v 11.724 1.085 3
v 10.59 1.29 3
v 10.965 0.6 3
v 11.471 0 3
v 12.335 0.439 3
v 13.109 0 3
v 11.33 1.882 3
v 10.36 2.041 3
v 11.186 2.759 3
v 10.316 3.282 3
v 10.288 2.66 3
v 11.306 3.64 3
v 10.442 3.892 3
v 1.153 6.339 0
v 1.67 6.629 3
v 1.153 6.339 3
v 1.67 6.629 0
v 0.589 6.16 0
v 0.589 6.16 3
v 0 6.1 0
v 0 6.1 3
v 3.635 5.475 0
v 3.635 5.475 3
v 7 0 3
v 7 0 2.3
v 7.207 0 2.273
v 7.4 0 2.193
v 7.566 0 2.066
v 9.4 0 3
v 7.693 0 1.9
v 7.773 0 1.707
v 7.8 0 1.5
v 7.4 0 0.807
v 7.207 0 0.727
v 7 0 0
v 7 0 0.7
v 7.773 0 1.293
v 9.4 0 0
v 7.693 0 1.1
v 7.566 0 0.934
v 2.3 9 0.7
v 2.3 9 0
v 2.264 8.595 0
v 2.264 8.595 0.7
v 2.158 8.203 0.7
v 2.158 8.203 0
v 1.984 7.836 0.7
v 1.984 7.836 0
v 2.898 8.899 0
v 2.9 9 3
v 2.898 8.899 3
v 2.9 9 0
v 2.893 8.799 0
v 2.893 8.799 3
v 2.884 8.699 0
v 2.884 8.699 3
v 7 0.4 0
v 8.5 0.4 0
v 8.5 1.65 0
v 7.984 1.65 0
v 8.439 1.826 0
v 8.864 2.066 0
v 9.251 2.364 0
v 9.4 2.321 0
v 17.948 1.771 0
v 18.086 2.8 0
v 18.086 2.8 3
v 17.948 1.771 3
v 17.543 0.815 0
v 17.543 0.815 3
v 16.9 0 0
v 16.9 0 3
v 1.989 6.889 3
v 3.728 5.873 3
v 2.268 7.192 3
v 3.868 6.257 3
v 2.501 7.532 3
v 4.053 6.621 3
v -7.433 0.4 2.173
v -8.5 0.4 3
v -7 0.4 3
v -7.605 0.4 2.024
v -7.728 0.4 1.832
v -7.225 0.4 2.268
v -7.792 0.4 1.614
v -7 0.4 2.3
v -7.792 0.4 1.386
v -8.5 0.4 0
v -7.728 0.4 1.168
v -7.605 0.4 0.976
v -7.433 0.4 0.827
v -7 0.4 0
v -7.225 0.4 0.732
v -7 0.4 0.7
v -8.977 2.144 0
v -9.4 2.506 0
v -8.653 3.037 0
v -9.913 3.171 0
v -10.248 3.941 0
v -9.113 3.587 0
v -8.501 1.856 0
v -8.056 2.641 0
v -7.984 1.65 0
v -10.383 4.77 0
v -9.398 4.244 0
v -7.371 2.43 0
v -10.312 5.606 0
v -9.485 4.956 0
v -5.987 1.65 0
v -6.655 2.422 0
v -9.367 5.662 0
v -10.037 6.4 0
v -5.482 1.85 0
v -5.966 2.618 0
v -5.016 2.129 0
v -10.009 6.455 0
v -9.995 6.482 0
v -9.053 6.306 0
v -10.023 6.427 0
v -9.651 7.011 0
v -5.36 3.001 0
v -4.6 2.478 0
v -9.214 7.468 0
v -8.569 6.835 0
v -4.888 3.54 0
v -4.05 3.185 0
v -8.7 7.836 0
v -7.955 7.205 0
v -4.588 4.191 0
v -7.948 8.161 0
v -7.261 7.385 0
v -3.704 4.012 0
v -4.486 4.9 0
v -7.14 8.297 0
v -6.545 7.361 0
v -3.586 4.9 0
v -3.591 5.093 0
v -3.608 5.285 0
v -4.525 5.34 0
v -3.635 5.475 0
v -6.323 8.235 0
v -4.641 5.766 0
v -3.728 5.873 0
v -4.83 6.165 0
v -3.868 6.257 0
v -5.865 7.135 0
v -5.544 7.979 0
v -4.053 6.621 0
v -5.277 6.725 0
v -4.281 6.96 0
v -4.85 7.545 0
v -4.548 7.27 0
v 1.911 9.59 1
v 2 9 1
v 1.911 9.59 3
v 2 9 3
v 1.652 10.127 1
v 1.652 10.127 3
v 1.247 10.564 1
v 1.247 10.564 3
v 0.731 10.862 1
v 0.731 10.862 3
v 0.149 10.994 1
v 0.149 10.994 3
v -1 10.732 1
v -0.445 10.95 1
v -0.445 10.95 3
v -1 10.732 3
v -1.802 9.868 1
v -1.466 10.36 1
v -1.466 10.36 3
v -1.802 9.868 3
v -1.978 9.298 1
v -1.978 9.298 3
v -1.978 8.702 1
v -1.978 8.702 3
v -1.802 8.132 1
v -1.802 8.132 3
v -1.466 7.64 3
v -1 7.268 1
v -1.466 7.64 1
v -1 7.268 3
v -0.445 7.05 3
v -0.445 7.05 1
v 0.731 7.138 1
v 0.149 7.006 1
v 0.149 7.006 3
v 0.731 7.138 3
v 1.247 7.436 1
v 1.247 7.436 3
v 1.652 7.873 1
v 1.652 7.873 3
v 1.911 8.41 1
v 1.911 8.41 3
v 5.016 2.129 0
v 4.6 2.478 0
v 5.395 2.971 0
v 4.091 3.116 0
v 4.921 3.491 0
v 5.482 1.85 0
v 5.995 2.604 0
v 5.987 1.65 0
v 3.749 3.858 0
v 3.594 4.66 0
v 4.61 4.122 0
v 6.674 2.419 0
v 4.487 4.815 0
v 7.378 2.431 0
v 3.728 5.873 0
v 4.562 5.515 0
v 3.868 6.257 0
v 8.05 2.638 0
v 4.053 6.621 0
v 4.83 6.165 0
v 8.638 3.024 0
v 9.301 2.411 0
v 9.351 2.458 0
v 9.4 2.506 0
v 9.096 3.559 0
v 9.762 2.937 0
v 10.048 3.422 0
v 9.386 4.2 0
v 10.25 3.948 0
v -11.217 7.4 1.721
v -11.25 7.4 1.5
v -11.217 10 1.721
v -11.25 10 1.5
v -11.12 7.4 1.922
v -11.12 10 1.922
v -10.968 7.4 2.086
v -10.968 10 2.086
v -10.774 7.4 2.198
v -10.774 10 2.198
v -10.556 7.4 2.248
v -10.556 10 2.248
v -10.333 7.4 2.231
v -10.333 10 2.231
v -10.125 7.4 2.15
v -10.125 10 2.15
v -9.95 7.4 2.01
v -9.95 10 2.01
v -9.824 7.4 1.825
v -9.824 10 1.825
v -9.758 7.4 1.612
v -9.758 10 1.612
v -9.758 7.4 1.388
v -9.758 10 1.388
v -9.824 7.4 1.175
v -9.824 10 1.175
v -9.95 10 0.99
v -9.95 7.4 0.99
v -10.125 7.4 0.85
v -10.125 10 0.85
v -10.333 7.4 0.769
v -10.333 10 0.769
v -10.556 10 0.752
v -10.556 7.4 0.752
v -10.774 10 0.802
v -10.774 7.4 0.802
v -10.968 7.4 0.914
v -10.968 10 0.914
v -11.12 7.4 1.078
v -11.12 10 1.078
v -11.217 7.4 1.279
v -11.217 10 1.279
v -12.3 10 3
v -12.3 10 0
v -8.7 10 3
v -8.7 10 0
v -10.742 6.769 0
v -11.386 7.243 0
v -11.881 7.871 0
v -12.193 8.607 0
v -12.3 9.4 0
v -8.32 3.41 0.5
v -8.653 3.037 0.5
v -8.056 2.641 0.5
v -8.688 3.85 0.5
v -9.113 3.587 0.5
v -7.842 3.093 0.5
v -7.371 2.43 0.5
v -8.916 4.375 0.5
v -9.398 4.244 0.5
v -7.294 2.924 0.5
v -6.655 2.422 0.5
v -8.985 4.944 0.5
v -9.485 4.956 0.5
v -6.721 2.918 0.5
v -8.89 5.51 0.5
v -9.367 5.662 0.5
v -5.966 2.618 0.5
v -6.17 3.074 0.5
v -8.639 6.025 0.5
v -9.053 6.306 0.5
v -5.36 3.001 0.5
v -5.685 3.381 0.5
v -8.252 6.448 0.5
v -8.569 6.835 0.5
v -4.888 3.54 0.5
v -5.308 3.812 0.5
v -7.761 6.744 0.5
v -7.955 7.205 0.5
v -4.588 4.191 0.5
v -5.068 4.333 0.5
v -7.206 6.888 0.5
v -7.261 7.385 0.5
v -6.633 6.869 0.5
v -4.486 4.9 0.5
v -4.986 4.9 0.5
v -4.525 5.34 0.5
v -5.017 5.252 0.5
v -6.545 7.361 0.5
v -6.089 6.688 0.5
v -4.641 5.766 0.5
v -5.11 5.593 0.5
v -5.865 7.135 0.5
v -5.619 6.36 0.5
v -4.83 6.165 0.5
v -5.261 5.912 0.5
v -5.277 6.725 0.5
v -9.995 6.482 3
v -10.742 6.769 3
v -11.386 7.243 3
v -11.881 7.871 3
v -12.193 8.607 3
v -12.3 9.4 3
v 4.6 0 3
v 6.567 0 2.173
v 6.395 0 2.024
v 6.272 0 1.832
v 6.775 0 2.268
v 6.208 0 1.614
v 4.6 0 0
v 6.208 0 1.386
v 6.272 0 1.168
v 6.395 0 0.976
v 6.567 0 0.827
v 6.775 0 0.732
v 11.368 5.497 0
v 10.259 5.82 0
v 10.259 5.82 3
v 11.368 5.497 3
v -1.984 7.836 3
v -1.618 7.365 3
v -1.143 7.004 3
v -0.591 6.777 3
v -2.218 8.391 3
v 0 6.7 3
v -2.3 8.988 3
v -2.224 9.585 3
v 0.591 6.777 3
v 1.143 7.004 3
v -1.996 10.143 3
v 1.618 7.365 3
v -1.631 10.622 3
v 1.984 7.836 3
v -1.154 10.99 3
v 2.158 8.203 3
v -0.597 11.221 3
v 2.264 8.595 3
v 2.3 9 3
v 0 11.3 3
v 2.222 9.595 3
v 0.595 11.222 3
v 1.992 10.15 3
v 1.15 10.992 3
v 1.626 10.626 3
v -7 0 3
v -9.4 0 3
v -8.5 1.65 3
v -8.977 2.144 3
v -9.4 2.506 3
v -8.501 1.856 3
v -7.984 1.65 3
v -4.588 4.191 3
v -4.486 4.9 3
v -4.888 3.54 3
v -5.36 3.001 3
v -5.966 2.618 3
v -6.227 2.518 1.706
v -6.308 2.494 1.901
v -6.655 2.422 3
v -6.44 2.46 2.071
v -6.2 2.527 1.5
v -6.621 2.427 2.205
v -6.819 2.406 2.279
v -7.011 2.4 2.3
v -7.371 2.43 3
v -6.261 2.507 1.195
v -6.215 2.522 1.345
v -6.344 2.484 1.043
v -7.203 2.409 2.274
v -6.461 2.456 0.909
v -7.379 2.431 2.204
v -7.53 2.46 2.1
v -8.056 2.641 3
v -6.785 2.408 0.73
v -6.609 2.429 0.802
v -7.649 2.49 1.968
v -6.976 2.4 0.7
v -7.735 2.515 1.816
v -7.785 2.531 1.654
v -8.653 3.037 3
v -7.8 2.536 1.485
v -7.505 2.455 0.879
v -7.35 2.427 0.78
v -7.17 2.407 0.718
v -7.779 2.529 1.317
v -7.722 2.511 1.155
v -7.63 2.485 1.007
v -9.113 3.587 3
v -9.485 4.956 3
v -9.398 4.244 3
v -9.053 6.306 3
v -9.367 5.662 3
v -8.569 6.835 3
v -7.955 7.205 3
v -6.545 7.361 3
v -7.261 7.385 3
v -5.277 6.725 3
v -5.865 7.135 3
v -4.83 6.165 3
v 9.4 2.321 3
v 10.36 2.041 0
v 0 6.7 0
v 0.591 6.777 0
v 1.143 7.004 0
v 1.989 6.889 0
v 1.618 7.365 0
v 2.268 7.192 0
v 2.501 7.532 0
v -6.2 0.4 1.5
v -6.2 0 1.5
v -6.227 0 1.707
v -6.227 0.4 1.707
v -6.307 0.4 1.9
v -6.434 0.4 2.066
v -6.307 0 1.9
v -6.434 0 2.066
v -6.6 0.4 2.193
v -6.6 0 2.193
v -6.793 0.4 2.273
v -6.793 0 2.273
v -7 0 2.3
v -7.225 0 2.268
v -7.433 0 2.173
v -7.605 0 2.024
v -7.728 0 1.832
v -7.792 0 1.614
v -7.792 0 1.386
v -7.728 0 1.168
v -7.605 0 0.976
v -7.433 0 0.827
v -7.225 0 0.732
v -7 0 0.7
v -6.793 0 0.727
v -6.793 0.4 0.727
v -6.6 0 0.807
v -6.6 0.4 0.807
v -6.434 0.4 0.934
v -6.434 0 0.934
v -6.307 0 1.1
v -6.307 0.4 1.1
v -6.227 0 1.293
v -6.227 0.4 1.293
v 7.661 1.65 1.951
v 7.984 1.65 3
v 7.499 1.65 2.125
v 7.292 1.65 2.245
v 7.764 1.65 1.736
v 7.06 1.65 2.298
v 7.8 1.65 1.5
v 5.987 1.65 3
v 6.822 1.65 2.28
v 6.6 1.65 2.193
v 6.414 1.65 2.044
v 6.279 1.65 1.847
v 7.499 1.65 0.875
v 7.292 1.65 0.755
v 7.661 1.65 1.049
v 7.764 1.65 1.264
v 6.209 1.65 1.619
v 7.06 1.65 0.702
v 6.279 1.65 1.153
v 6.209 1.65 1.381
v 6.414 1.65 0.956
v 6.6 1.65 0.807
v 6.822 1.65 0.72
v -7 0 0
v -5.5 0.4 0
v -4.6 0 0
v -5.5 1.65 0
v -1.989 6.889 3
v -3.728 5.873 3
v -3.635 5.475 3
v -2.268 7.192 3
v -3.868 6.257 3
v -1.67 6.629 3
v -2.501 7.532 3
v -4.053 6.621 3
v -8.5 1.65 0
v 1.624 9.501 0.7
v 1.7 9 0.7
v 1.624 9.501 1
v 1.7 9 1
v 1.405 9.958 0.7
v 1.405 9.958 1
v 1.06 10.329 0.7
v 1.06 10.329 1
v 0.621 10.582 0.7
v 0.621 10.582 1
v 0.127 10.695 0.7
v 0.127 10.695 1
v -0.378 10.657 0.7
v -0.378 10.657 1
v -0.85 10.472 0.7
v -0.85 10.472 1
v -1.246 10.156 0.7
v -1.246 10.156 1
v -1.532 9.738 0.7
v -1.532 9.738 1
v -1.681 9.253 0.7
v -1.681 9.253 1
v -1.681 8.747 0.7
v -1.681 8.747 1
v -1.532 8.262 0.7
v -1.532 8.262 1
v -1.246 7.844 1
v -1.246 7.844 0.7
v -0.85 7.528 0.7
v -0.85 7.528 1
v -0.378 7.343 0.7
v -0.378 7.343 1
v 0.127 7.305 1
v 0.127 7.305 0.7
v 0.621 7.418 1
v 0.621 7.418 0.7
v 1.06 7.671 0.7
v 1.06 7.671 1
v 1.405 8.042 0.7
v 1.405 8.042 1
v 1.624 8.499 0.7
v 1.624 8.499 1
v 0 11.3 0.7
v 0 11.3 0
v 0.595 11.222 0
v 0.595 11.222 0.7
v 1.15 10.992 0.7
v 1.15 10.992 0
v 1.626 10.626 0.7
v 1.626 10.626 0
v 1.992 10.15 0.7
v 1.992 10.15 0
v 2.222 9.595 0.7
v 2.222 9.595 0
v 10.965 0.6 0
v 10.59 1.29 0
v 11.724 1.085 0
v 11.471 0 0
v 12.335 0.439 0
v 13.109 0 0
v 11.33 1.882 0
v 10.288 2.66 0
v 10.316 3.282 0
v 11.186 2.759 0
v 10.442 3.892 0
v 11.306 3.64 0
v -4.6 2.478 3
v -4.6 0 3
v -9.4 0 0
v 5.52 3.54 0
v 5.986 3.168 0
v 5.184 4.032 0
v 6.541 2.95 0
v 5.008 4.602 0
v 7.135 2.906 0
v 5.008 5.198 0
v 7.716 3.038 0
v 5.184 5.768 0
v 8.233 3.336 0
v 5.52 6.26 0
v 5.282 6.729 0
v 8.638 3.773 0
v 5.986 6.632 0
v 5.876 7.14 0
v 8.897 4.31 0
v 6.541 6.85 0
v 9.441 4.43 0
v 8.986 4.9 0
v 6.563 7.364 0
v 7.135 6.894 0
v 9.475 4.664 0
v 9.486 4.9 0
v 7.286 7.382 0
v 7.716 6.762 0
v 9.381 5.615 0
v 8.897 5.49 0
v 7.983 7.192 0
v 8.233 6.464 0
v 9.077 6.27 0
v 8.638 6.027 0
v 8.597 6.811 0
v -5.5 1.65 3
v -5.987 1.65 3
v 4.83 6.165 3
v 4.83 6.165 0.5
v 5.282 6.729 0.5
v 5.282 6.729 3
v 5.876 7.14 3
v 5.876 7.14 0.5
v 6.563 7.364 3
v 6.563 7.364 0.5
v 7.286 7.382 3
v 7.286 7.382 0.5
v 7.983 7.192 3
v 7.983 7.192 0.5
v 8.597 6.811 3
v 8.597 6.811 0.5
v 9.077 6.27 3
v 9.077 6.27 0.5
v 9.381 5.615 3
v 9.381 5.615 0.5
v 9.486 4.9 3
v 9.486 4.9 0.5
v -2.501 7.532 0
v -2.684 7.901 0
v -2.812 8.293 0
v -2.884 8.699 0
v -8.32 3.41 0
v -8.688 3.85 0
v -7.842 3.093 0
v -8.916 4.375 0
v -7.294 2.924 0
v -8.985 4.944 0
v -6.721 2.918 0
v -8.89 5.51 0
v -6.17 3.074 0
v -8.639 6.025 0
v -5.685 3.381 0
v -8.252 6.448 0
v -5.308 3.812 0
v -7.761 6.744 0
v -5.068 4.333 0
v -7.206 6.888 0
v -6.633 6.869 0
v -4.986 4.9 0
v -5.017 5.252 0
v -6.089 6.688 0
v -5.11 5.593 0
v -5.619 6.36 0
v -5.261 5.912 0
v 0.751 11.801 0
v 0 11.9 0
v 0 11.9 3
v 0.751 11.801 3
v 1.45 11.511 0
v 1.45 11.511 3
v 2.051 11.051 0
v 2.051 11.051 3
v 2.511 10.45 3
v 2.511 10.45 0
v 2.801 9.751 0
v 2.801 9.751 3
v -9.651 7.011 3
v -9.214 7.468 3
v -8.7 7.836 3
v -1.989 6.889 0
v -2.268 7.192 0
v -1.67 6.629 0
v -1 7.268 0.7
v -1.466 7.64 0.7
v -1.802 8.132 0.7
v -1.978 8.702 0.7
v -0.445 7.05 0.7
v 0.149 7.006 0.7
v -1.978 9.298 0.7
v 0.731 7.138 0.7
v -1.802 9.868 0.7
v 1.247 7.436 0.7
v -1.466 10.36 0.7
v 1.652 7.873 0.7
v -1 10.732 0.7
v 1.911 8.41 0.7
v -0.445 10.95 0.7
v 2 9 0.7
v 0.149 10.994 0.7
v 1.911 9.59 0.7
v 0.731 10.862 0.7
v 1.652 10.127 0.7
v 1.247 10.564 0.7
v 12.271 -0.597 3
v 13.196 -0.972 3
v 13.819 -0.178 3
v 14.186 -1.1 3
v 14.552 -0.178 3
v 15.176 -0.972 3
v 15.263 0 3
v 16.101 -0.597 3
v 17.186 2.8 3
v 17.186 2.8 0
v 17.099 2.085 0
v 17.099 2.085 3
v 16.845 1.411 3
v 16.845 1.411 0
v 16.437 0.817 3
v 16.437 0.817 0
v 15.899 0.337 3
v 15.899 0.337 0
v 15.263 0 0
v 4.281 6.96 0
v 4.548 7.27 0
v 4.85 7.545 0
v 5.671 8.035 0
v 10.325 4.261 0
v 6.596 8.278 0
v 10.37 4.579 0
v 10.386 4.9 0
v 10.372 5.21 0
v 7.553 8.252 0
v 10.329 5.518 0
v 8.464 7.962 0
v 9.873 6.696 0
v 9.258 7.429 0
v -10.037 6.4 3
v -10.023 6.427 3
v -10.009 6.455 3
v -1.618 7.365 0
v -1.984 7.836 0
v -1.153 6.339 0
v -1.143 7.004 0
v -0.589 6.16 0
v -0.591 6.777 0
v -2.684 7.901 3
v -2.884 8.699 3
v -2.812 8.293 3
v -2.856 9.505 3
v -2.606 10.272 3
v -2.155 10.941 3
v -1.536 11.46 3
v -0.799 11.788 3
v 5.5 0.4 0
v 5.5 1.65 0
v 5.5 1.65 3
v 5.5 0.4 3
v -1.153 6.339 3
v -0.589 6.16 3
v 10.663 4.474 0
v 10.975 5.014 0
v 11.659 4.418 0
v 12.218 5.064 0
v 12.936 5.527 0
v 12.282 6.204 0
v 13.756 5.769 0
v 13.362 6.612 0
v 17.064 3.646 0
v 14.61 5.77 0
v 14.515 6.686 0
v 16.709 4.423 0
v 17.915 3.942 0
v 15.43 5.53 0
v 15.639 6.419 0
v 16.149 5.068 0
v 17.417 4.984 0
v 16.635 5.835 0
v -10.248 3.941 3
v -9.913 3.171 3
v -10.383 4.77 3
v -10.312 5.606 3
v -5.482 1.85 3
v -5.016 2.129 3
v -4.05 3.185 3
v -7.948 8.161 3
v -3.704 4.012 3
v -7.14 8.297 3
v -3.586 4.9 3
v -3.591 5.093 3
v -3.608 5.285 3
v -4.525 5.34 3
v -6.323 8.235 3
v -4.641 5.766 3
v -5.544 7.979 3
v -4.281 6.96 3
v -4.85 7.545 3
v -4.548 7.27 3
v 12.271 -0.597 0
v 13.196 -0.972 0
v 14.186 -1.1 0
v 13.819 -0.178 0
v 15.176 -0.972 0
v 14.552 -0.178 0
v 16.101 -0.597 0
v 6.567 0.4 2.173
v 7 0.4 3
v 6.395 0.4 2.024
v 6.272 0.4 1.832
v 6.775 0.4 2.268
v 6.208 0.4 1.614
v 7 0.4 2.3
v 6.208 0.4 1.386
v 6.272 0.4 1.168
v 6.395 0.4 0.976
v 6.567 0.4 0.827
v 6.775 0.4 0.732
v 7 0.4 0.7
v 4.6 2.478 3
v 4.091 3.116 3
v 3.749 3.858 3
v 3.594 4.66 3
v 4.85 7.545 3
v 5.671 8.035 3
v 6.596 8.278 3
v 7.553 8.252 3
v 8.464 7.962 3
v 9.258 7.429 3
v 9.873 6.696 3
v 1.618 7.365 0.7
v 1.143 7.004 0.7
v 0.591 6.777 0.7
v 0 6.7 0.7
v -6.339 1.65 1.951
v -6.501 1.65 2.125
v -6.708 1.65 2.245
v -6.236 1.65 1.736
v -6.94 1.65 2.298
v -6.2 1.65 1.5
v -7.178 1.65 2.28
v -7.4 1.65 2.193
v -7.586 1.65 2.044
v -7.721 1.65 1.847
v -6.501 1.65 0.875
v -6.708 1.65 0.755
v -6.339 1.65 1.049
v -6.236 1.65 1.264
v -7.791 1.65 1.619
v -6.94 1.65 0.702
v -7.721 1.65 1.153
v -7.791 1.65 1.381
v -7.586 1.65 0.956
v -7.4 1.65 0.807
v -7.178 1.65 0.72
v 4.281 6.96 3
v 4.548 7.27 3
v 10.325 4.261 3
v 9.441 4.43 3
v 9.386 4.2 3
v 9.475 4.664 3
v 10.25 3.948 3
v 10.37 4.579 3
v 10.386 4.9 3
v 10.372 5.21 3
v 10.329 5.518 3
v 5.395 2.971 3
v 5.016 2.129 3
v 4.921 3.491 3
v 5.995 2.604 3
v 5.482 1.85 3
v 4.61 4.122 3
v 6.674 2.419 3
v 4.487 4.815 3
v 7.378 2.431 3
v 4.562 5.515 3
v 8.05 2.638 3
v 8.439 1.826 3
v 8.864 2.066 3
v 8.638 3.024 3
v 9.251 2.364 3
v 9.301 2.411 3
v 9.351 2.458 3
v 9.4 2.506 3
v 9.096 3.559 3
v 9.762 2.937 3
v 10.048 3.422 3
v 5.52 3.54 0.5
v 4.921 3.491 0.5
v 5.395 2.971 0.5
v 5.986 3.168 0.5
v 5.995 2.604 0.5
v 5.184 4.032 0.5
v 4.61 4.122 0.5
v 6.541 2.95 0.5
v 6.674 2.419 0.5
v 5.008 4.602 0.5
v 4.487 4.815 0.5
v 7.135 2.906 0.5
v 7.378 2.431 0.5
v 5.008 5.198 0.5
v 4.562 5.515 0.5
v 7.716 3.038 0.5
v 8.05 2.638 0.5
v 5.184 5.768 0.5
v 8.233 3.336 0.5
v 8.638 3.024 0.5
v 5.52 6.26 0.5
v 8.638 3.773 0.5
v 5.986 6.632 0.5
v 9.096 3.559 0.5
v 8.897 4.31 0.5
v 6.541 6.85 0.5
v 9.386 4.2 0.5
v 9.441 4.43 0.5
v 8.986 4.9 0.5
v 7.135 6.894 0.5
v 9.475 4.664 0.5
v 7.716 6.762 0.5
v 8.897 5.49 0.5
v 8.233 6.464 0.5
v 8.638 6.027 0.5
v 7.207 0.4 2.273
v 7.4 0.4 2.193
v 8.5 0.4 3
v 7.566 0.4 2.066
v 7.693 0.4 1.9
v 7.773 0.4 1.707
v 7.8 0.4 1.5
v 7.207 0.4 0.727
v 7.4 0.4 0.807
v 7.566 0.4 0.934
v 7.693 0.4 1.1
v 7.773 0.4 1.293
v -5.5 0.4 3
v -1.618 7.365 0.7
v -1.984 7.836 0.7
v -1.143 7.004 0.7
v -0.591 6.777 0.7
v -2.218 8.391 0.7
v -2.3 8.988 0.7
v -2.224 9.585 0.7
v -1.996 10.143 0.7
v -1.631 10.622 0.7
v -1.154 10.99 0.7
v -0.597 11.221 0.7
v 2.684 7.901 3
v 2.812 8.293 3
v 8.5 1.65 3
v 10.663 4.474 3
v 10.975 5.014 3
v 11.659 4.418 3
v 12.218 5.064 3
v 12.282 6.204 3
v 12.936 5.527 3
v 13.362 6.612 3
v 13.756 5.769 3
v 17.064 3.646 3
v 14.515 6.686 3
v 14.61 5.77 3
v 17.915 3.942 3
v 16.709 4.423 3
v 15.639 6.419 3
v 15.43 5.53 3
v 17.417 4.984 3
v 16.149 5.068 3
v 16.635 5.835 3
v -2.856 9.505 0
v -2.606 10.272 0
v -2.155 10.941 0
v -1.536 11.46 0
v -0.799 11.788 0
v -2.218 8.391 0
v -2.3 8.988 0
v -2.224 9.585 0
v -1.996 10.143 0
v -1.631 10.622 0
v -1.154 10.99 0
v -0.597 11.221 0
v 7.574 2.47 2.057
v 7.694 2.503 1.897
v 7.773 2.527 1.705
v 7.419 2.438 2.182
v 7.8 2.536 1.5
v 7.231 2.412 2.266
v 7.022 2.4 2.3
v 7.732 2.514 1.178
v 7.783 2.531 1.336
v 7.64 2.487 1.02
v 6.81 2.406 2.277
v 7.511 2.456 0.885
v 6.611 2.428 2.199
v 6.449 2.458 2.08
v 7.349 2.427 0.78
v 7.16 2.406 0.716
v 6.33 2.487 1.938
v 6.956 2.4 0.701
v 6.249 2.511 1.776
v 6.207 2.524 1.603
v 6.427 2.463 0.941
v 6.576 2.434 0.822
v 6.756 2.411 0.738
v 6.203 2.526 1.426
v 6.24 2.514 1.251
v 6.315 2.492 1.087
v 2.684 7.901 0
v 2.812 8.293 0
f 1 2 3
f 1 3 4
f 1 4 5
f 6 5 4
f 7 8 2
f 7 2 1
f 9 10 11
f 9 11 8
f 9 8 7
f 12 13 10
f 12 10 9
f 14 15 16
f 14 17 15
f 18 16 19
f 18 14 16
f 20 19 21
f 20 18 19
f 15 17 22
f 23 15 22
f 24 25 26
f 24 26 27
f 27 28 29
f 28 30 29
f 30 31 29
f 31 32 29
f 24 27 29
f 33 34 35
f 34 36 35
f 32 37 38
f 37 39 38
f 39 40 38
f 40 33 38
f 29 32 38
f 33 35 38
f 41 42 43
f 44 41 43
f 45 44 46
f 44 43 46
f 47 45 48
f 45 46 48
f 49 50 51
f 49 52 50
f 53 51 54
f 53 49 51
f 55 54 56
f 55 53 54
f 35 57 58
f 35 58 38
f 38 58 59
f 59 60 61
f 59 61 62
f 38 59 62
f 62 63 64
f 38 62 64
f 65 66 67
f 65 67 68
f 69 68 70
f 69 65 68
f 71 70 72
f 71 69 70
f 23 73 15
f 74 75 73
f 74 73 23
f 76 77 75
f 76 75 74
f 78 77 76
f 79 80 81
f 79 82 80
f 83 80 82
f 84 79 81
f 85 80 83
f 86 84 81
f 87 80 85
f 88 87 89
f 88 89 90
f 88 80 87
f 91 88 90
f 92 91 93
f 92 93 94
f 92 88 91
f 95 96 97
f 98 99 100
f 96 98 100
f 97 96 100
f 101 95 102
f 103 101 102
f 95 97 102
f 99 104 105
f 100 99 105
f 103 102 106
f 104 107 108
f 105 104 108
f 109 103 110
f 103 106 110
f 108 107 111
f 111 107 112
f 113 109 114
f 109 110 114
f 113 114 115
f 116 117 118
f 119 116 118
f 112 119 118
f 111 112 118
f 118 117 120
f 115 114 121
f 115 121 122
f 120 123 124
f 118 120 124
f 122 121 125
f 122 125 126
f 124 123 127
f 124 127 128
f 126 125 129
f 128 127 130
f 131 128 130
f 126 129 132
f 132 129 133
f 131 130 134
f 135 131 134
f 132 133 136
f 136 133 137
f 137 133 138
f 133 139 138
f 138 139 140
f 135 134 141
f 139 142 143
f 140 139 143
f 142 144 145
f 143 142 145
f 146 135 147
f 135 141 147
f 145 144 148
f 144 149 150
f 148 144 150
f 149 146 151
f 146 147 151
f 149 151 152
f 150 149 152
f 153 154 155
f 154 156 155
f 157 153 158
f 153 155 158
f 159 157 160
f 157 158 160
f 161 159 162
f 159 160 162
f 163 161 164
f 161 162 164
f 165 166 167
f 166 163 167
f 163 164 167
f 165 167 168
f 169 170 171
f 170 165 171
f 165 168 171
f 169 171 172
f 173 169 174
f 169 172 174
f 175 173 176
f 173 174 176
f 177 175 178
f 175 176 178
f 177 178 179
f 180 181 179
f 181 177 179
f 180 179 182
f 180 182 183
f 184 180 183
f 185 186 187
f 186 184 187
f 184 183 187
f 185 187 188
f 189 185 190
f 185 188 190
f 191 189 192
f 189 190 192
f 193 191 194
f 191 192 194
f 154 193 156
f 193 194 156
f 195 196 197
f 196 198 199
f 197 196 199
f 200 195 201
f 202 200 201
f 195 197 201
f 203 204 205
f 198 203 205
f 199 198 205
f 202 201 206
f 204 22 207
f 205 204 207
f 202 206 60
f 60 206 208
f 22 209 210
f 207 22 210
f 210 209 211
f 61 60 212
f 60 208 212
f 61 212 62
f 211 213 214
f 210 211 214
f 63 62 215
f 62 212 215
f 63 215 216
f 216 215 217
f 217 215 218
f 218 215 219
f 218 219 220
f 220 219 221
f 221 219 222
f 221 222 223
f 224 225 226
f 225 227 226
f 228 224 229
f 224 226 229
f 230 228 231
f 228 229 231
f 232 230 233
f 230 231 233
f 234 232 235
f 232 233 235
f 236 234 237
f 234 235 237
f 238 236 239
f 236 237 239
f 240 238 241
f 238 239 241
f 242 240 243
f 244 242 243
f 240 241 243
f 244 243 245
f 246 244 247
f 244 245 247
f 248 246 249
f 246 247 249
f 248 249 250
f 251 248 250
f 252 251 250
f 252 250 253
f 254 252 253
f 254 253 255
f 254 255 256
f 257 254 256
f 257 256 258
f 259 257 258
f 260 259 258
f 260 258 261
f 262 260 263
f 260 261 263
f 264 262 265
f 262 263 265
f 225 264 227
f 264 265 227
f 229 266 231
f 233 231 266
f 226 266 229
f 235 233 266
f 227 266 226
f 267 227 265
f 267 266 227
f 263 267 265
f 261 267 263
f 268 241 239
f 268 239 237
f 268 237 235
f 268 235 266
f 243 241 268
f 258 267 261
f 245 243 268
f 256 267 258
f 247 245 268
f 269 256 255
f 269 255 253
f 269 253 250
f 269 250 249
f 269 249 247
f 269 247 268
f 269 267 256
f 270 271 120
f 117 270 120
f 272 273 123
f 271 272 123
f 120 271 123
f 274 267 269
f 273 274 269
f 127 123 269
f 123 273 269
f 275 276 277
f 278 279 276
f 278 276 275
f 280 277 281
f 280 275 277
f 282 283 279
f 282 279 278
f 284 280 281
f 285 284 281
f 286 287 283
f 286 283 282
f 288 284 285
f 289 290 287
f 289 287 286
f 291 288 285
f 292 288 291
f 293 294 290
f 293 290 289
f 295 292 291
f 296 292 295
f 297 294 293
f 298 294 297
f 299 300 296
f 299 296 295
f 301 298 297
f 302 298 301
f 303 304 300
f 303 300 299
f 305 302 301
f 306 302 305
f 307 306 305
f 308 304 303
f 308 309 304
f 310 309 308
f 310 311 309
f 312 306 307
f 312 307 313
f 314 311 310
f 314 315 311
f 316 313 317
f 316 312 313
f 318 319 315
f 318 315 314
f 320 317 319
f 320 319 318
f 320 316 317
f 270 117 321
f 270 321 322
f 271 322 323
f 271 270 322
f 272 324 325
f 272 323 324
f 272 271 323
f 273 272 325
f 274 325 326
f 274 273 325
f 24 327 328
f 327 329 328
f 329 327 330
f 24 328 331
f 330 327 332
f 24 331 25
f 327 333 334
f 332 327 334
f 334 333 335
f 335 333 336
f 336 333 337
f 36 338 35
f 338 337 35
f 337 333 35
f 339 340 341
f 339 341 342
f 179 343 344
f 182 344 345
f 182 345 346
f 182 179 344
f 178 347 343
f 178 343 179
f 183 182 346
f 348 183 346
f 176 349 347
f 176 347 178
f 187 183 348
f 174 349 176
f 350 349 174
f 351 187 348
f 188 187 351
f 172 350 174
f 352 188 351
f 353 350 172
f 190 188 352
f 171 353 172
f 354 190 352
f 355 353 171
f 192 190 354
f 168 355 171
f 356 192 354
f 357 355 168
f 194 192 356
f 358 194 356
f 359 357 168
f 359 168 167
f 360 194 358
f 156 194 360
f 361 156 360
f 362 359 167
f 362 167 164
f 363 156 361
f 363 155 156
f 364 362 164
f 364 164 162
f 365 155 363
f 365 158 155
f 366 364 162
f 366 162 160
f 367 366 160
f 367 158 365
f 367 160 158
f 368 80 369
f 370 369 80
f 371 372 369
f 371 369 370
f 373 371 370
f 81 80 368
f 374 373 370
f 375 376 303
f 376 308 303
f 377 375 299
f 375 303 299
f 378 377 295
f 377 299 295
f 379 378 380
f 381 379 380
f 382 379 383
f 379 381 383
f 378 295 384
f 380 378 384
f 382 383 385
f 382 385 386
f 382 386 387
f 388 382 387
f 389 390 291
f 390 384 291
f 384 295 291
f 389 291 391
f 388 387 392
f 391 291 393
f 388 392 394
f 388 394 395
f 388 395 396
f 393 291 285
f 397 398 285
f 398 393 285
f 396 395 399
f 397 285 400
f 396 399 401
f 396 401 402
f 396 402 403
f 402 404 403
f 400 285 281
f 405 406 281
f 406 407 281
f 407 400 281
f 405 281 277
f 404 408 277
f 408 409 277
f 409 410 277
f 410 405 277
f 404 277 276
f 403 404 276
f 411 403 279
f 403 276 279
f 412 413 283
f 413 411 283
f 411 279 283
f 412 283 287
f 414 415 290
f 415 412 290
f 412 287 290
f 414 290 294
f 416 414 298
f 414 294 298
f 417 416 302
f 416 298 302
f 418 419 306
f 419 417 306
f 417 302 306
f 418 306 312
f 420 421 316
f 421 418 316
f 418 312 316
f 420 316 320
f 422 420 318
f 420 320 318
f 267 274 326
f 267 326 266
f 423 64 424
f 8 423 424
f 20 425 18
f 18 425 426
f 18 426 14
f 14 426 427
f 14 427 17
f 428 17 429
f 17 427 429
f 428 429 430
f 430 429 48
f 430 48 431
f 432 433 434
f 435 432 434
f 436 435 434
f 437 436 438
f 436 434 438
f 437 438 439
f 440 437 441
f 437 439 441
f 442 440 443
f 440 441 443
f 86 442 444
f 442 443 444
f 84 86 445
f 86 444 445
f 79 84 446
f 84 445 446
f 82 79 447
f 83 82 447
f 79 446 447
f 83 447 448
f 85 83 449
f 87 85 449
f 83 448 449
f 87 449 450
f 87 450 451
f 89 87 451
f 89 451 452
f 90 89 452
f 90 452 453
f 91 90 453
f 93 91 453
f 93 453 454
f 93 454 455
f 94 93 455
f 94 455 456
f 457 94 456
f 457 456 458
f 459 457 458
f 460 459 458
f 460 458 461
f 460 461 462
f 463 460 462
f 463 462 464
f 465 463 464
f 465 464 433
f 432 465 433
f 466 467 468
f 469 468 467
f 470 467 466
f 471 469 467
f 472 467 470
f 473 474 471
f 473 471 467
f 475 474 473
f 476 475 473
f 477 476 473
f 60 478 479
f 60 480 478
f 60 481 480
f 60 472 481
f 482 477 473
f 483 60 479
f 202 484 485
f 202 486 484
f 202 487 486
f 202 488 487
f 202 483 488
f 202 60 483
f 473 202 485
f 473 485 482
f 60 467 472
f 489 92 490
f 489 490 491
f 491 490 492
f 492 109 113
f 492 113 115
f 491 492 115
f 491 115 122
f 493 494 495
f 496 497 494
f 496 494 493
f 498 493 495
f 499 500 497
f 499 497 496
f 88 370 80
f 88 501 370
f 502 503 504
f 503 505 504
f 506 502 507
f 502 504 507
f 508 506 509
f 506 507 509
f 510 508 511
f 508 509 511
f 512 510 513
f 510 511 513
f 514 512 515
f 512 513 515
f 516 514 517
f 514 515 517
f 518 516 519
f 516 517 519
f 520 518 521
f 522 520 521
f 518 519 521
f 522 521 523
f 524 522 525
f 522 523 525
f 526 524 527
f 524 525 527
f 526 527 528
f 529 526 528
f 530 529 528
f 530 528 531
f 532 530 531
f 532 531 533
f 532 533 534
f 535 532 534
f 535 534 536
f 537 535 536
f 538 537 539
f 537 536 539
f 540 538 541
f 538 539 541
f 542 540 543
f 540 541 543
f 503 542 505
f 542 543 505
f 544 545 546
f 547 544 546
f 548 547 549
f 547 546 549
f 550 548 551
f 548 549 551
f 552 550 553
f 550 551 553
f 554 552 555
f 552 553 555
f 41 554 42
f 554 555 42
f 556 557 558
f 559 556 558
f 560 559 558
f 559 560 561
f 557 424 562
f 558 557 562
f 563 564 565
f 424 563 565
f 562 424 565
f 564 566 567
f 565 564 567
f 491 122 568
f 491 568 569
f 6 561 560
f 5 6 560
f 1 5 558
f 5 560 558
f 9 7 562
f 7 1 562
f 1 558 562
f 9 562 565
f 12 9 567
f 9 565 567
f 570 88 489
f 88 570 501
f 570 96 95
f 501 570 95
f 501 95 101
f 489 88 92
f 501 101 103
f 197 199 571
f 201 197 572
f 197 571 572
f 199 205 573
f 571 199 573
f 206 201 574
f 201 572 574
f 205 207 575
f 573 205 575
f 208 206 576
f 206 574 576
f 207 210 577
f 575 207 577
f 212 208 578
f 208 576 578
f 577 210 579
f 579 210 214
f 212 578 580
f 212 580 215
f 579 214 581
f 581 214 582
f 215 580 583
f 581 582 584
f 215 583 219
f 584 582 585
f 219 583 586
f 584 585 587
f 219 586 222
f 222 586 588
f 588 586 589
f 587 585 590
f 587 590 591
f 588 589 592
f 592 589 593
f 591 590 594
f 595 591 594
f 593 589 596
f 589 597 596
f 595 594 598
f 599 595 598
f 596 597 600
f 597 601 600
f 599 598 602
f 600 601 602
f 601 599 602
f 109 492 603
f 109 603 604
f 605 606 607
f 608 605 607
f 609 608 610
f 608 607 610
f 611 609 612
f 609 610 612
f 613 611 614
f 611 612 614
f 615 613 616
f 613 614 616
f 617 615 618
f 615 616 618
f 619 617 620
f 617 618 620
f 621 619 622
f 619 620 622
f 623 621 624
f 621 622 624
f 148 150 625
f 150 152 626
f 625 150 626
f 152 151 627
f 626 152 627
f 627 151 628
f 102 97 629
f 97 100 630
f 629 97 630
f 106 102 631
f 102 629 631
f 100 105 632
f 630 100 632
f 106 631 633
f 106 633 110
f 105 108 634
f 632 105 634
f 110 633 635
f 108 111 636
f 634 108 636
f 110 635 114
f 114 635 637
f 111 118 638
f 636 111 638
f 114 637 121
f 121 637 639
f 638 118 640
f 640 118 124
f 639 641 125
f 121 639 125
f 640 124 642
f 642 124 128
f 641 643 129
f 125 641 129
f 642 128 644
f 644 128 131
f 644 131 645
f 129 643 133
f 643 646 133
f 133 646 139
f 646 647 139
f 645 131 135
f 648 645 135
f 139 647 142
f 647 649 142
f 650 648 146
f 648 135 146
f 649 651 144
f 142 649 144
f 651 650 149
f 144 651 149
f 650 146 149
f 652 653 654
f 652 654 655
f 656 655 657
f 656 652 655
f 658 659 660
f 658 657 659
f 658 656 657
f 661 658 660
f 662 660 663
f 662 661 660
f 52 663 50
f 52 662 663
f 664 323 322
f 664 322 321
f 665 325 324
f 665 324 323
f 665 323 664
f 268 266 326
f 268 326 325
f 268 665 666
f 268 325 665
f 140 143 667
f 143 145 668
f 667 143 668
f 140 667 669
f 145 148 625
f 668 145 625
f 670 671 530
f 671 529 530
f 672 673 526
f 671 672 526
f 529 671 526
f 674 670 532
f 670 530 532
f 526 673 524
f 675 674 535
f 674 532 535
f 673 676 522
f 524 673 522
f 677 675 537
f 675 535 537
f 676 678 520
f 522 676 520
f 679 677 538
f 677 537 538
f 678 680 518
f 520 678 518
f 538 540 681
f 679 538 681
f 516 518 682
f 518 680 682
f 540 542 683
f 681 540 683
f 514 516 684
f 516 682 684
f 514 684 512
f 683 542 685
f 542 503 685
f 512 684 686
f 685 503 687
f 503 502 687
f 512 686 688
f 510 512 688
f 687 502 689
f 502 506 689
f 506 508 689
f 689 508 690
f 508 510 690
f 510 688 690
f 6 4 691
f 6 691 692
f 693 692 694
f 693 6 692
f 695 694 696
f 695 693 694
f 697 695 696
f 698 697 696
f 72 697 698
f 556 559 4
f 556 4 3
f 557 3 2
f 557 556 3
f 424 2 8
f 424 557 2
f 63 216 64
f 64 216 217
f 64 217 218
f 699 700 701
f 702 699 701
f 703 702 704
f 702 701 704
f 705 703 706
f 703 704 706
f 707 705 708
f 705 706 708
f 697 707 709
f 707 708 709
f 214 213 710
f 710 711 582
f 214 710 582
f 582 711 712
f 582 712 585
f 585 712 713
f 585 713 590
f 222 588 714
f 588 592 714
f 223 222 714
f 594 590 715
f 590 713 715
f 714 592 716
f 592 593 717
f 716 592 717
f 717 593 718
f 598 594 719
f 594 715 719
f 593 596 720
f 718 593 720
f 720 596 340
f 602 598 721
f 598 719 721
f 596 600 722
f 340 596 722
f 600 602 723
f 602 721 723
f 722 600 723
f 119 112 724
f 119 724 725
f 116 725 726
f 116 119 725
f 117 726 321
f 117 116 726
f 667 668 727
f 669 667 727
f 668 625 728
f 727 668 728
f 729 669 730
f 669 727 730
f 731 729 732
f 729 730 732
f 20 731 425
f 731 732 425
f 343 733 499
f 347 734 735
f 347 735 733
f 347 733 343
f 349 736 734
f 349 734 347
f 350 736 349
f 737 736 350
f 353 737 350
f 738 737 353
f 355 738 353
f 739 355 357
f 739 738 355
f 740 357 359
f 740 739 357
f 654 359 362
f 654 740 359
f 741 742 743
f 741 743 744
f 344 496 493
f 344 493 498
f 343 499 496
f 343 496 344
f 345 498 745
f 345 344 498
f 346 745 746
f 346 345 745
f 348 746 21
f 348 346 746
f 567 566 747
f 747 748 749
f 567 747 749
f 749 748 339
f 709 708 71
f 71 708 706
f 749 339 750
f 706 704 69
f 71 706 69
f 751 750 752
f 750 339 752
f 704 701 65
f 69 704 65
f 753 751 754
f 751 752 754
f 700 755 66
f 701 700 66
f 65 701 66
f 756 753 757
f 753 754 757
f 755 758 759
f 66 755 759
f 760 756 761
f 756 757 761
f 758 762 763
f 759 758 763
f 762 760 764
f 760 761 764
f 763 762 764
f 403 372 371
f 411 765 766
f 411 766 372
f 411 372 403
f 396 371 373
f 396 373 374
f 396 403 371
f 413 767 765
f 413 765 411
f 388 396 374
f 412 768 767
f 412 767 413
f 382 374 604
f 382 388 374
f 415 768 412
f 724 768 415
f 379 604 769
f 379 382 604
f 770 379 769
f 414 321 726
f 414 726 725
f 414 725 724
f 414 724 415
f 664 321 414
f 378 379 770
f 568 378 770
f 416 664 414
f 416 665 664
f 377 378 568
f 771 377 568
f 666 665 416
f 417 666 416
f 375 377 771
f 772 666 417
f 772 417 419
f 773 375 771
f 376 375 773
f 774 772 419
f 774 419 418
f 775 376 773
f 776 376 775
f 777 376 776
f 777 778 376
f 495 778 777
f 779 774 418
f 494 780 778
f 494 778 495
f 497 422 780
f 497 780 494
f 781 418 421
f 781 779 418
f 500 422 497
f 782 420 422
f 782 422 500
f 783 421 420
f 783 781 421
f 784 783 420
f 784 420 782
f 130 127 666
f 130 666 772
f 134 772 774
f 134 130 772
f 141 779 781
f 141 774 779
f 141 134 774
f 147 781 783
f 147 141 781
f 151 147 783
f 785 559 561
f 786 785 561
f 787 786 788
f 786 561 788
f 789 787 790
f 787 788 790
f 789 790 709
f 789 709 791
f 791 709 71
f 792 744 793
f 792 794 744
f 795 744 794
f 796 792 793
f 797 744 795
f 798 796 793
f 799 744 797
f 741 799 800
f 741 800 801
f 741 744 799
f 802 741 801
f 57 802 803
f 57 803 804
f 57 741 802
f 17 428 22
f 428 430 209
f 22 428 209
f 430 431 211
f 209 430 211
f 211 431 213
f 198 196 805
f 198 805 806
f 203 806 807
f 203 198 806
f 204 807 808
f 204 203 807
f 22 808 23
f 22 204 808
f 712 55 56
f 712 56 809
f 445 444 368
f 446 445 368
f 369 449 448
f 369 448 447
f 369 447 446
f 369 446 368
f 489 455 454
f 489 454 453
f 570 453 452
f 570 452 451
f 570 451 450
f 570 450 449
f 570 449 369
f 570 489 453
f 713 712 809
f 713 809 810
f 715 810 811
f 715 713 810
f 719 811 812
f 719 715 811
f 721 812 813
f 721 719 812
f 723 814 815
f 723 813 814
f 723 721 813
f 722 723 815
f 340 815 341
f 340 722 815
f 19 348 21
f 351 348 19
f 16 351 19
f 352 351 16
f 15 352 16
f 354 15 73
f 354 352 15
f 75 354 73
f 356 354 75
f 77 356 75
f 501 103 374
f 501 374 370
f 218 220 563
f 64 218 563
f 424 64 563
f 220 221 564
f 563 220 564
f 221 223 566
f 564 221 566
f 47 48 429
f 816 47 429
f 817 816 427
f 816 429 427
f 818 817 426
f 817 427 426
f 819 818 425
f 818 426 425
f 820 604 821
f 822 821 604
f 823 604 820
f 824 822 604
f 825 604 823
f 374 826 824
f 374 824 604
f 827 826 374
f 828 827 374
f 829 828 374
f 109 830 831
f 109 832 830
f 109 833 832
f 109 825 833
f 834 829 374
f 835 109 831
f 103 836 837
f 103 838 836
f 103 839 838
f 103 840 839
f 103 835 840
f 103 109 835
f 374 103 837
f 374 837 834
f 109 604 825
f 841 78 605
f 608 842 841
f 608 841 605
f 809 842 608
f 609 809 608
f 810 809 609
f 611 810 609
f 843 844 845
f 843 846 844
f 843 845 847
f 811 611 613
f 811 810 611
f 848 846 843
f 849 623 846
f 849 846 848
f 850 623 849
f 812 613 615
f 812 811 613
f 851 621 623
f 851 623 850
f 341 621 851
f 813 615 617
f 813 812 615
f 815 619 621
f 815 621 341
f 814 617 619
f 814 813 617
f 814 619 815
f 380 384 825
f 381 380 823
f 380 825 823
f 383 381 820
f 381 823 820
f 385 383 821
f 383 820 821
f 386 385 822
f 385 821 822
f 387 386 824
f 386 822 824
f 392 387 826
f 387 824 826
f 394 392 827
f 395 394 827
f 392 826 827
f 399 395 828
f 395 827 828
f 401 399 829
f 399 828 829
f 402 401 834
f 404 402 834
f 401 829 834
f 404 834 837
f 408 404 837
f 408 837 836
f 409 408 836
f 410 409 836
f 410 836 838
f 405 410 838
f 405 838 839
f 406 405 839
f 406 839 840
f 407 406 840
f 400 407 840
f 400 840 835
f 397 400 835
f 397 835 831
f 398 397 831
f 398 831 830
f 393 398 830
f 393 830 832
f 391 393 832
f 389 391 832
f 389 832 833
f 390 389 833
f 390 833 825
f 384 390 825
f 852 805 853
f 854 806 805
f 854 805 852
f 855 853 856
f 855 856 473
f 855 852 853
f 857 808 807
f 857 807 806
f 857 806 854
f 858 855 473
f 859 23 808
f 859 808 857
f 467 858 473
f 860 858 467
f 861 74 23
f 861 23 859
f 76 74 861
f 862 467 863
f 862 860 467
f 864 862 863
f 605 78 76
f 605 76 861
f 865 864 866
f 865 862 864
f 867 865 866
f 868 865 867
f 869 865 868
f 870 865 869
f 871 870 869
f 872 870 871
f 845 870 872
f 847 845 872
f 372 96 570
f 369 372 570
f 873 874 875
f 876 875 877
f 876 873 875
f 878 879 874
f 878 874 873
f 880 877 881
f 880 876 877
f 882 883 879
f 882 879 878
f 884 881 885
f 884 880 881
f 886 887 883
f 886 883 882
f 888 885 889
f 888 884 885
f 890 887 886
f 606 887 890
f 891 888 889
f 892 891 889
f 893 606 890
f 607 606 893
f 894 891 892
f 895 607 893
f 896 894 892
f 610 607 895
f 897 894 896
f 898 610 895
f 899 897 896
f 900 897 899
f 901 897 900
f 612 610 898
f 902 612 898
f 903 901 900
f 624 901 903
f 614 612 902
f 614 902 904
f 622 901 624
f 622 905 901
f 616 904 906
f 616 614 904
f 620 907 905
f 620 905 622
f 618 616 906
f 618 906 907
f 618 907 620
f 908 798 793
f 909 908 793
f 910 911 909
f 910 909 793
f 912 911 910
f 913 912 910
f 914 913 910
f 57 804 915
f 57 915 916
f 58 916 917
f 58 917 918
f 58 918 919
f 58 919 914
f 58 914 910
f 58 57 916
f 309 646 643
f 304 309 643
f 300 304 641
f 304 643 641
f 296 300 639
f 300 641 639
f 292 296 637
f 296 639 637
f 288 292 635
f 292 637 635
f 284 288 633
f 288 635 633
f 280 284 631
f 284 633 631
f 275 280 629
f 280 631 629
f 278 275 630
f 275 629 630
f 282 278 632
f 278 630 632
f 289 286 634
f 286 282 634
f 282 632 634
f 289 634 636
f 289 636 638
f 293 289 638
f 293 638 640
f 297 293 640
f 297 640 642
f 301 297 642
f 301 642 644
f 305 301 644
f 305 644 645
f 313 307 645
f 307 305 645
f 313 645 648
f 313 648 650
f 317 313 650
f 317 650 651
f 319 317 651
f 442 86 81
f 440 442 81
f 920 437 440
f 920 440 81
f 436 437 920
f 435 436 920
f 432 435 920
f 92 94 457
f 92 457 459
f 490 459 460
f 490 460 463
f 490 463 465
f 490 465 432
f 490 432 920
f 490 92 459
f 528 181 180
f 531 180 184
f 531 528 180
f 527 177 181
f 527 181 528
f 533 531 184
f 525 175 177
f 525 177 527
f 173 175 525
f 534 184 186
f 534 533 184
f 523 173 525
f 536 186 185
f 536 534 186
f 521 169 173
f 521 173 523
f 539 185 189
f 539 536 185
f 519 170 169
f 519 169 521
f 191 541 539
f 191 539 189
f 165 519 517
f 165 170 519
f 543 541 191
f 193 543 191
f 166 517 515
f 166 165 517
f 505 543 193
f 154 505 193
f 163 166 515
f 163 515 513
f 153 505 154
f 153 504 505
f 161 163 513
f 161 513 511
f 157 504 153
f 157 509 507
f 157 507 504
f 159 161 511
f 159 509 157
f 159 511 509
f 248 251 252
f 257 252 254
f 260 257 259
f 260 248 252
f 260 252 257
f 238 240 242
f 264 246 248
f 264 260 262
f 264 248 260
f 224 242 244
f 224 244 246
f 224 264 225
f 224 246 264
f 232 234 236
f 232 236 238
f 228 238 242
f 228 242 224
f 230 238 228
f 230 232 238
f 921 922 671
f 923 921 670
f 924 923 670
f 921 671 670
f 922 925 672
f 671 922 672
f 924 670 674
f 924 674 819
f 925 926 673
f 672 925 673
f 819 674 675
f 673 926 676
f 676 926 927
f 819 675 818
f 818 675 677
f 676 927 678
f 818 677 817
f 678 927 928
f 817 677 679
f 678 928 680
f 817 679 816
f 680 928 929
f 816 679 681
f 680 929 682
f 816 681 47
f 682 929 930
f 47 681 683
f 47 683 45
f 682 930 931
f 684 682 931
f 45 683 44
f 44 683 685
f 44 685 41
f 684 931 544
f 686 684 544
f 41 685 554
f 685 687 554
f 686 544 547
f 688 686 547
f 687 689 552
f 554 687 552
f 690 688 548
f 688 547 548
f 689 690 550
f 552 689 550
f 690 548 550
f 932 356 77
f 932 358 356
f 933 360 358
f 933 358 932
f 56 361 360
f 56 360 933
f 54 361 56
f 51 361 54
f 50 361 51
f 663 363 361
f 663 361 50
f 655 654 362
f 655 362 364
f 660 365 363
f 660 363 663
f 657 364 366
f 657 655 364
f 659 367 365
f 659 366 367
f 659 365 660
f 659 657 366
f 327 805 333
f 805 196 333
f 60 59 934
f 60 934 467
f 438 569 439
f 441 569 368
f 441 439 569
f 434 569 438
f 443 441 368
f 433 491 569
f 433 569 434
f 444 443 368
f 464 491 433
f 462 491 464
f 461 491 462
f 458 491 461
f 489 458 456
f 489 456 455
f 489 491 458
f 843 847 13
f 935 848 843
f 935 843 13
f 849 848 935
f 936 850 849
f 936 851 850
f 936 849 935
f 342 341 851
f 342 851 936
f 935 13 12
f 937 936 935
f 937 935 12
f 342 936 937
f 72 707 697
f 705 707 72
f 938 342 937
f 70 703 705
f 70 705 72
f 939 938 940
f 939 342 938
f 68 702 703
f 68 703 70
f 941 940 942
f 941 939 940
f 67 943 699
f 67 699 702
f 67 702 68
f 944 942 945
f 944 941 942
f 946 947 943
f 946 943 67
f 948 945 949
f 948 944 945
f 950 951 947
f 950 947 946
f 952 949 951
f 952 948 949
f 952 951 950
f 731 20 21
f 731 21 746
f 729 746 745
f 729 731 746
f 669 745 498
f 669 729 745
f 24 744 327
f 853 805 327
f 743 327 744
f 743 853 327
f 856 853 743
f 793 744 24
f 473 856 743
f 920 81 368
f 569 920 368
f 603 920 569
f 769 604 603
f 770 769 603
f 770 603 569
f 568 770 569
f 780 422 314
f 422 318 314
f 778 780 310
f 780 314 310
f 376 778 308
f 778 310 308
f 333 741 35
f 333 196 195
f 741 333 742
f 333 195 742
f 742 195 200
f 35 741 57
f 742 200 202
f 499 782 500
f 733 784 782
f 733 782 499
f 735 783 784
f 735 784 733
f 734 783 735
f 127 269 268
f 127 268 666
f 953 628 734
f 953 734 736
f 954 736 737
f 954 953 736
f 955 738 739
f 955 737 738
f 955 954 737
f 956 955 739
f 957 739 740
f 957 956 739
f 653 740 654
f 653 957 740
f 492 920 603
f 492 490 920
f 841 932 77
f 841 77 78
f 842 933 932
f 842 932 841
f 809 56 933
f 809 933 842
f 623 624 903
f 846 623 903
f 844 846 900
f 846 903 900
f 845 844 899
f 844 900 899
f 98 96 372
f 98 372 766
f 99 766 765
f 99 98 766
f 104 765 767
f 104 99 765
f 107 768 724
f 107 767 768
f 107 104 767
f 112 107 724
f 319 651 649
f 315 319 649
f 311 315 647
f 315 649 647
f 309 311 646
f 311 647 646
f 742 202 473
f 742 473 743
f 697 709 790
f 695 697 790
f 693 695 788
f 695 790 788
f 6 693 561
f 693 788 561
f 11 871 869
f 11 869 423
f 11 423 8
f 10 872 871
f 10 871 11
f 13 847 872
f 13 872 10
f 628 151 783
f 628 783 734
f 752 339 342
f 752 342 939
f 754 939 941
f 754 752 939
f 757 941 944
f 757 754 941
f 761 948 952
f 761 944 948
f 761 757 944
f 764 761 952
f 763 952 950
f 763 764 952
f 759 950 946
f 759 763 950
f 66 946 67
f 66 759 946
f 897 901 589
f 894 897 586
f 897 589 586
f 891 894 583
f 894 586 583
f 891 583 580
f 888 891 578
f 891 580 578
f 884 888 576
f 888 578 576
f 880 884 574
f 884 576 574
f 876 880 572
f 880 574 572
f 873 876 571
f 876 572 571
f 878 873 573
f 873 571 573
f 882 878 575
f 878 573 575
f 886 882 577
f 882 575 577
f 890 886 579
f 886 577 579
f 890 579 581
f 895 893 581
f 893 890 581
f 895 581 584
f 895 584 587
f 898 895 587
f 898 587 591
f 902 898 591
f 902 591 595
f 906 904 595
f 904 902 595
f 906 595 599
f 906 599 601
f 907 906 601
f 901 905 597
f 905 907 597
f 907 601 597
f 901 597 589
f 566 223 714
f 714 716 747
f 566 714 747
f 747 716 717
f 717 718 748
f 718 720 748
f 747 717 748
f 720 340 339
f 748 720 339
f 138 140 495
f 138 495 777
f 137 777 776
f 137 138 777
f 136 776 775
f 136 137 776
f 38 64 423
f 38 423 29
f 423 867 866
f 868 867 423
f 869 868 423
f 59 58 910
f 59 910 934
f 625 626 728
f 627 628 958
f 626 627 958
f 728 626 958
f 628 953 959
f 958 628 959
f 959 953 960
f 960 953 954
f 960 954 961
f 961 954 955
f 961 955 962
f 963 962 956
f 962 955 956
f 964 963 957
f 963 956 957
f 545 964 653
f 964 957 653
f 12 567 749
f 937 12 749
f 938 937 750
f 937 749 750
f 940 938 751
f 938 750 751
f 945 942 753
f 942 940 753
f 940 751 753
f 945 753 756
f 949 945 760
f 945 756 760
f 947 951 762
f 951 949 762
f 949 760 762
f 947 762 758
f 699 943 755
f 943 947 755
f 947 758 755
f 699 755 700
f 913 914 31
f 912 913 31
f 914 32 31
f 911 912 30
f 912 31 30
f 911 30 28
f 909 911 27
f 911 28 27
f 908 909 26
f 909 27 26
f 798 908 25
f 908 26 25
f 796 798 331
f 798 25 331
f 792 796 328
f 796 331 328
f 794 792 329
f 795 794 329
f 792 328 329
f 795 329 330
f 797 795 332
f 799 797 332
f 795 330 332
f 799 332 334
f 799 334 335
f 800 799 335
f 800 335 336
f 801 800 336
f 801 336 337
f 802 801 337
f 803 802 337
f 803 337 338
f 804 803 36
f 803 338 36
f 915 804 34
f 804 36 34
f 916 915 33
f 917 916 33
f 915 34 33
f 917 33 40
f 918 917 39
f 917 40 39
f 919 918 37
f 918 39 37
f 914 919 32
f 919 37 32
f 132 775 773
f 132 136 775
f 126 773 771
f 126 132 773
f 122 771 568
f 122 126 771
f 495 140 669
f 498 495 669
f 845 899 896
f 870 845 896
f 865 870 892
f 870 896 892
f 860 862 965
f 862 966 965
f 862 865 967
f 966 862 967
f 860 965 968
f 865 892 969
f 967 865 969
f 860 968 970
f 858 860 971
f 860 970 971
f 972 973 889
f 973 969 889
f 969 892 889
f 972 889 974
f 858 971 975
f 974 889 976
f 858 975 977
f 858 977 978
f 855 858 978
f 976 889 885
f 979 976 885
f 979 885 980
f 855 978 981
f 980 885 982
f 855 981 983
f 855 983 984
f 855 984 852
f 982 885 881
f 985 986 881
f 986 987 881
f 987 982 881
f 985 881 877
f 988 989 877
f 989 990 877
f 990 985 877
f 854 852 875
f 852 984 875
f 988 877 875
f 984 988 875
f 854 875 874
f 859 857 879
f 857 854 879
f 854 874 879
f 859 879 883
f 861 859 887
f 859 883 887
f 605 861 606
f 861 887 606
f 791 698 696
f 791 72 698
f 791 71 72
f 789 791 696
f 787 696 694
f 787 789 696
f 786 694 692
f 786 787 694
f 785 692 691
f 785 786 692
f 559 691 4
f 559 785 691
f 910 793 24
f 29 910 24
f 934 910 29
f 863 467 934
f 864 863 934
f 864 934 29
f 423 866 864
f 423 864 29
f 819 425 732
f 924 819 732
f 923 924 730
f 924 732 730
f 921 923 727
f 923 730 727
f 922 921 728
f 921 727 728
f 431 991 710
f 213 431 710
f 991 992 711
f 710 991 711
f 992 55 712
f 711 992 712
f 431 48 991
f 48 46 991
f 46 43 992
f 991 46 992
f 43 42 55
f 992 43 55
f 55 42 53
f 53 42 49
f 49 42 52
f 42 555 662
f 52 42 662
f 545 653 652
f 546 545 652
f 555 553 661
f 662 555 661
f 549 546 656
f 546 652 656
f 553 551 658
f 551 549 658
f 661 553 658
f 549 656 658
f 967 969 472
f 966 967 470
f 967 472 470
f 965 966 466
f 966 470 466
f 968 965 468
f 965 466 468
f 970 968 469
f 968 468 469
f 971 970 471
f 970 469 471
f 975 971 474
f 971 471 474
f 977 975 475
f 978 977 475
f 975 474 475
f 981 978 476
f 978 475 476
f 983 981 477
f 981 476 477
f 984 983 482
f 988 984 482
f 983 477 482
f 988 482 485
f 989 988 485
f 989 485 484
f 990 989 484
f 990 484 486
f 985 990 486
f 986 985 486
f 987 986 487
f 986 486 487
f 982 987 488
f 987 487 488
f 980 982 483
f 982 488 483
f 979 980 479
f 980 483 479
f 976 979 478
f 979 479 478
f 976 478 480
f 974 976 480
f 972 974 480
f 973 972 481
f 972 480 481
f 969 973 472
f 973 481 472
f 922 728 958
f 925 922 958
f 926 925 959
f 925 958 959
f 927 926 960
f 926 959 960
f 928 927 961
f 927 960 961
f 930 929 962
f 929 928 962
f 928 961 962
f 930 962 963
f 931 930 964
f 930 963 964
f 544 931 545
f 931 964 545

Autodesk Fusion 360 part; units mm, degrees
sketch "スケッチ1" plane through (0, 0, 0) normal (0, 0, 1) x (1, 0, 0)
  line L0 (0, 0) -> (18.0857, 0)
  line L1 (18.0857, 0) -> (18.0857, 13.2439)
  line L2 (18.0857, 13.2439) -> (0, 13.2439)
  line L3 (0, 13.2439) -> (0, 0)
  line L4 (0, 0) -> (-13.9996, 0)
  line L5 (-13.9996, 0) -> (-13.9996, 13.2439)
  line L6 (-13.9996, 13.2439) -> (0, 13.2439)
  line L7 (0, 13.2439) -> (0, 0)
  circle A0 centre (-6.9857, 4.9) radius 2
  circle A1 centre (6.9857, 4.9) radius 2
  circle A2 centre (0, 9) radius 2
  circle A3 centre (14.1857, 2.8) radius 3
  circle A4 centre (-6.9857, 4.9) radius 2.5
  circle A5 centre (6.9857, 4.9) radius 2.5
  circle A6 centre (0, 9) radius 2.3
  circle A7 centre (0, 9) radius 1.7
  line L8 (-7, 1.5) -> (-7, 0)
  line L9 (7, 1.5) -> (7, 0)
  circle A8 centre (-6.9857, 4.9) radius 3.4
  circle A9 centre (0, 9) radius 2.9
  line L10 (-6.9857, 4.9) -> (0, 9)
  line L11 (0, 9) -> (6.9857, 4.9)
  line L12 (6.9857, 4.9) -> (14.1857, 2.8)
  circle A10 centre (6.9857, 4.9) radius 3.4
  circle A11 centre (14.1857, 2.8) radius 3.9
  line L13 (-4.6, 2.4775) -> (-4.6, 0)
  line L14 (4.6, 2.4775) -> (4.6, 0)
  line L15 (-9.4, 2.506) -> (-9.4, 0)
  line L16 (9.4, 2.506) -> (9.4, 0)
  line L17 (-3.6347, 5.4753) -> (-1.6695, 6.6287)
  line L18 (1.6695, 6.6287) -> (3.6347, 5.4753)
  line L19 (-4.8495, 7.5452) -> (-2.8843, 8.6986)
  line L20 (2.8843, 8.6986) -> (4.8495, 7.5452)
  line L21 (10.2588, 5.8204) -> (11.3683, 5.4967)
  line L22 (9.2508, 2.3644) -> (10.3603, 2.0407)
  line L23 (0, 0) -> (18.0857, 0)
  line L24 (18.0857, 0) -> (18.0857, -2.0683)
  line L25 (18.0857, -2.0683) -> (0, -2.0683)
  line L26 (-13.9996, 0) -> (0, 0)
  line L27 (0, -2.0683) -> (-13.9996, -2.0683)
  line L28 (-13.9996, -2.0683) -> (-13.9996, 0)
  line L29 (-12.3, 6.4) -> (-12.3, 10)
  line L30 (-12.3, 10) -> (-8.7, 10)
  line L31 (-8.7, 10) -> (-8.7, 7.8362)
  line L32 (-12.3, 6.4) -> (-10.0369, 6.4)
  line L33 (-5.5, 1.65) -> (-8.5, 1.65)
  line L34 (-8.5, 1.65) -> (-8.5, 0.4)
  line L35 (-8.5, 0.4) -> (-5.5, 0.4)
  line L36 (-5.5, 0.4) -> (-5.5, 1.65)
  line L37 (-5.5, 1.65) -> (-8.5, 0.4) construction
  line L38 (-8.5, 1.65) -> (-5.5, 0.4) construction
  line L39 (8.5, 1.65) -> (5.5, 1.65)
  line L40 (5.5, 1.65) -> (5.5, 0.4)
  line L41 (5.5, 0.4) -> (8.5, 0.4)
  line L42 (8.5, 0.4) -> (8.5, 1.65)
  line L43 (8.5, 1.65) -> (5.5, 0.4) construction
  line L44 (5.5, 1.65) -> (8.5, 0.4) construction
  arc A12 (-12.3, 9.4) -> (-9.3, 6.4) centre (-9.3, 9.4) ccw
  point P0 (-7, 1.5)
  point P1 (7, 1.5)
  point P2 (-10.5, 10)
  point P3 (-7, 1.025)
  point P4 (7, 1.025)
  dimension "d4" = 4
  dimension "d5" = 4.9
  dimension "d6" = 8.1
  dimension "d7" = 4
  dimension "d10" = 6
  dimension "d16" = 2.8
  dimension "d18" = 9
  dimension "d19" = 5
  dimension "d21" = 7.5
  dimension "d26" = 4.6
  dimension "d34" = 3.4
  dimension "d41" = 7
  dimension "d45" = 5.8
  dimension "d51" = 1.2
  dimension "d52" = 4.8
  dimension "d54" = 1.8
  dimension "d57" = 6.8
  dimension "d76" = 7.8
  dimension "d86" = 10.5
  dimension "d87" = 3.6
  dimension "d88" = 10
  dimension "d92" = 3
  dimension "d93" = 0.4
  dimension "d94" = 1.25
  dimension "d96" = 3.6
  dimension "d97" = 3
extrude "押し出し1" add sketch "スケッチ1" along normal blind 3 contours L0 L9 A10 L14 L23 L39 L40 L41 | L3 L7 A6 A9 L10 | L3 L7 A6 A9 L11 | L4 L8 A8 L13 L26 L33 L35 L36 | L0 L9 A10 L16 L22 L23 L39 L41 L42 | A5 L11 L12 A10 L39 | A8 A9 L10 L17 | A9 L11 A10 L18 | L4 L8 A8 L15 L26 L33 L34 L35 | A8 L33 | L3 L7 A6 A9 L10 | L3 L7 A6 A9 L11 | A8 A9 L10 L19 | A9 L11 A10 L20 | L0 A3 L12 A11 L23 | L0 A3 A11 L23 | A10 L16 L22 | L12 A10 A11 L16 L22 | A5 L11 L12 A10 | L0 A3 L12 A11 L23 | L12 A10 A11 L21 | A8 L29 L30 L31 A12 picked at (-7.0288, 1.9011)
extrude "押し出し2" add sketch "スケッチ1" along normal blind 0.5 contours A4 | A1 A5 L11 L12 | A1 A5 L11 L12
extrude "押し出し5" add sketch "スケッチ1" against normal blind 2.3 from surface at 3 contours L3 L7 A2 A6 L10 | L3 L7 A2 A6 L11 | L3 L7 A2 A6 L10 | L3 L7 A2 A6 L11
sketch "スケッチ2" plane through (0, 0, 0) normal (0, -1, 0) x (1, 0, 0)
  line L0 (-7, 0) -> (-7, 3)
  line L1 (7, 0) -> (7, 3)
  circle A0 centre (-7, 1.5) radius 0.8
  circle A1 centre (7, 1.5) radius 0.8
  line L2 (9.4, 0) -> (9.4, 3)
  line L3 (4.6, 3) -> (4.6, 0)
  line L4 (-4.6, 3) -> (-9.4, 3)
  line L5 (4.6, 0) -> (9.4, 0)
  line L6 (-4.6, 0) -> (-4.6, 3)
  line L7 (-9.4, 3) -> (-9.4, 0)
  line L8 (9.4, 3) -> (4.6, 3)
  line L9 (-9.4, 0) -> (-4.6, 0)
  point P0 (7, 0)
  dimension "d42" = 1.6
extrude "押し出し7" cut sketch "スケッチ2" against normal blind 3 contours L0 A0 | L0 A0 | L1 A1 | L1 A1
extrude "押し出し8" add sketch "スケッチ1" against normal blind 0.3 from surface at 1 contours L3 L7 A2 A7 L10 | L3 L7 A2 A7 L11 | L3 L7 A2 A7 L10 | L3 L7 A2 A7 L11
sketch "スケッチ6" plane through (0, 10, 0) normal (0, 1, 0) x (-1, 0, 0)
  line L0 (8.7, 0) -> (12.3, 0)
  line L1 (12.3, 0) -> (12.3, 3)
  line L2 (12.3, 3) -> (8.7, 3)
  line L3 (8.7, 3) -> (8.7, 0)
  line L4 (10.5, 3) -> (10.5, 0)
  circle A0 centre (10.5, 1.5) radius 0.75
  dimension "d89" = 1.5
extrude "押し出し12" cut sketch "スケッチ6" against normal blind 2.6 contours L4 A0 | L4 A0
equation "d5 = 6.5 mm - 0.6 mm - 1.0 mm"
equation "d6 = 6 mm + 2.0 mm + 0.1 mm"
equation "d16 = ( 7.8 / 2 ) * 1 mm - 0.6 mm - 0.5 mm"
equation "d21 = 6 mm + 1.4 mm + 0.1 mm"
